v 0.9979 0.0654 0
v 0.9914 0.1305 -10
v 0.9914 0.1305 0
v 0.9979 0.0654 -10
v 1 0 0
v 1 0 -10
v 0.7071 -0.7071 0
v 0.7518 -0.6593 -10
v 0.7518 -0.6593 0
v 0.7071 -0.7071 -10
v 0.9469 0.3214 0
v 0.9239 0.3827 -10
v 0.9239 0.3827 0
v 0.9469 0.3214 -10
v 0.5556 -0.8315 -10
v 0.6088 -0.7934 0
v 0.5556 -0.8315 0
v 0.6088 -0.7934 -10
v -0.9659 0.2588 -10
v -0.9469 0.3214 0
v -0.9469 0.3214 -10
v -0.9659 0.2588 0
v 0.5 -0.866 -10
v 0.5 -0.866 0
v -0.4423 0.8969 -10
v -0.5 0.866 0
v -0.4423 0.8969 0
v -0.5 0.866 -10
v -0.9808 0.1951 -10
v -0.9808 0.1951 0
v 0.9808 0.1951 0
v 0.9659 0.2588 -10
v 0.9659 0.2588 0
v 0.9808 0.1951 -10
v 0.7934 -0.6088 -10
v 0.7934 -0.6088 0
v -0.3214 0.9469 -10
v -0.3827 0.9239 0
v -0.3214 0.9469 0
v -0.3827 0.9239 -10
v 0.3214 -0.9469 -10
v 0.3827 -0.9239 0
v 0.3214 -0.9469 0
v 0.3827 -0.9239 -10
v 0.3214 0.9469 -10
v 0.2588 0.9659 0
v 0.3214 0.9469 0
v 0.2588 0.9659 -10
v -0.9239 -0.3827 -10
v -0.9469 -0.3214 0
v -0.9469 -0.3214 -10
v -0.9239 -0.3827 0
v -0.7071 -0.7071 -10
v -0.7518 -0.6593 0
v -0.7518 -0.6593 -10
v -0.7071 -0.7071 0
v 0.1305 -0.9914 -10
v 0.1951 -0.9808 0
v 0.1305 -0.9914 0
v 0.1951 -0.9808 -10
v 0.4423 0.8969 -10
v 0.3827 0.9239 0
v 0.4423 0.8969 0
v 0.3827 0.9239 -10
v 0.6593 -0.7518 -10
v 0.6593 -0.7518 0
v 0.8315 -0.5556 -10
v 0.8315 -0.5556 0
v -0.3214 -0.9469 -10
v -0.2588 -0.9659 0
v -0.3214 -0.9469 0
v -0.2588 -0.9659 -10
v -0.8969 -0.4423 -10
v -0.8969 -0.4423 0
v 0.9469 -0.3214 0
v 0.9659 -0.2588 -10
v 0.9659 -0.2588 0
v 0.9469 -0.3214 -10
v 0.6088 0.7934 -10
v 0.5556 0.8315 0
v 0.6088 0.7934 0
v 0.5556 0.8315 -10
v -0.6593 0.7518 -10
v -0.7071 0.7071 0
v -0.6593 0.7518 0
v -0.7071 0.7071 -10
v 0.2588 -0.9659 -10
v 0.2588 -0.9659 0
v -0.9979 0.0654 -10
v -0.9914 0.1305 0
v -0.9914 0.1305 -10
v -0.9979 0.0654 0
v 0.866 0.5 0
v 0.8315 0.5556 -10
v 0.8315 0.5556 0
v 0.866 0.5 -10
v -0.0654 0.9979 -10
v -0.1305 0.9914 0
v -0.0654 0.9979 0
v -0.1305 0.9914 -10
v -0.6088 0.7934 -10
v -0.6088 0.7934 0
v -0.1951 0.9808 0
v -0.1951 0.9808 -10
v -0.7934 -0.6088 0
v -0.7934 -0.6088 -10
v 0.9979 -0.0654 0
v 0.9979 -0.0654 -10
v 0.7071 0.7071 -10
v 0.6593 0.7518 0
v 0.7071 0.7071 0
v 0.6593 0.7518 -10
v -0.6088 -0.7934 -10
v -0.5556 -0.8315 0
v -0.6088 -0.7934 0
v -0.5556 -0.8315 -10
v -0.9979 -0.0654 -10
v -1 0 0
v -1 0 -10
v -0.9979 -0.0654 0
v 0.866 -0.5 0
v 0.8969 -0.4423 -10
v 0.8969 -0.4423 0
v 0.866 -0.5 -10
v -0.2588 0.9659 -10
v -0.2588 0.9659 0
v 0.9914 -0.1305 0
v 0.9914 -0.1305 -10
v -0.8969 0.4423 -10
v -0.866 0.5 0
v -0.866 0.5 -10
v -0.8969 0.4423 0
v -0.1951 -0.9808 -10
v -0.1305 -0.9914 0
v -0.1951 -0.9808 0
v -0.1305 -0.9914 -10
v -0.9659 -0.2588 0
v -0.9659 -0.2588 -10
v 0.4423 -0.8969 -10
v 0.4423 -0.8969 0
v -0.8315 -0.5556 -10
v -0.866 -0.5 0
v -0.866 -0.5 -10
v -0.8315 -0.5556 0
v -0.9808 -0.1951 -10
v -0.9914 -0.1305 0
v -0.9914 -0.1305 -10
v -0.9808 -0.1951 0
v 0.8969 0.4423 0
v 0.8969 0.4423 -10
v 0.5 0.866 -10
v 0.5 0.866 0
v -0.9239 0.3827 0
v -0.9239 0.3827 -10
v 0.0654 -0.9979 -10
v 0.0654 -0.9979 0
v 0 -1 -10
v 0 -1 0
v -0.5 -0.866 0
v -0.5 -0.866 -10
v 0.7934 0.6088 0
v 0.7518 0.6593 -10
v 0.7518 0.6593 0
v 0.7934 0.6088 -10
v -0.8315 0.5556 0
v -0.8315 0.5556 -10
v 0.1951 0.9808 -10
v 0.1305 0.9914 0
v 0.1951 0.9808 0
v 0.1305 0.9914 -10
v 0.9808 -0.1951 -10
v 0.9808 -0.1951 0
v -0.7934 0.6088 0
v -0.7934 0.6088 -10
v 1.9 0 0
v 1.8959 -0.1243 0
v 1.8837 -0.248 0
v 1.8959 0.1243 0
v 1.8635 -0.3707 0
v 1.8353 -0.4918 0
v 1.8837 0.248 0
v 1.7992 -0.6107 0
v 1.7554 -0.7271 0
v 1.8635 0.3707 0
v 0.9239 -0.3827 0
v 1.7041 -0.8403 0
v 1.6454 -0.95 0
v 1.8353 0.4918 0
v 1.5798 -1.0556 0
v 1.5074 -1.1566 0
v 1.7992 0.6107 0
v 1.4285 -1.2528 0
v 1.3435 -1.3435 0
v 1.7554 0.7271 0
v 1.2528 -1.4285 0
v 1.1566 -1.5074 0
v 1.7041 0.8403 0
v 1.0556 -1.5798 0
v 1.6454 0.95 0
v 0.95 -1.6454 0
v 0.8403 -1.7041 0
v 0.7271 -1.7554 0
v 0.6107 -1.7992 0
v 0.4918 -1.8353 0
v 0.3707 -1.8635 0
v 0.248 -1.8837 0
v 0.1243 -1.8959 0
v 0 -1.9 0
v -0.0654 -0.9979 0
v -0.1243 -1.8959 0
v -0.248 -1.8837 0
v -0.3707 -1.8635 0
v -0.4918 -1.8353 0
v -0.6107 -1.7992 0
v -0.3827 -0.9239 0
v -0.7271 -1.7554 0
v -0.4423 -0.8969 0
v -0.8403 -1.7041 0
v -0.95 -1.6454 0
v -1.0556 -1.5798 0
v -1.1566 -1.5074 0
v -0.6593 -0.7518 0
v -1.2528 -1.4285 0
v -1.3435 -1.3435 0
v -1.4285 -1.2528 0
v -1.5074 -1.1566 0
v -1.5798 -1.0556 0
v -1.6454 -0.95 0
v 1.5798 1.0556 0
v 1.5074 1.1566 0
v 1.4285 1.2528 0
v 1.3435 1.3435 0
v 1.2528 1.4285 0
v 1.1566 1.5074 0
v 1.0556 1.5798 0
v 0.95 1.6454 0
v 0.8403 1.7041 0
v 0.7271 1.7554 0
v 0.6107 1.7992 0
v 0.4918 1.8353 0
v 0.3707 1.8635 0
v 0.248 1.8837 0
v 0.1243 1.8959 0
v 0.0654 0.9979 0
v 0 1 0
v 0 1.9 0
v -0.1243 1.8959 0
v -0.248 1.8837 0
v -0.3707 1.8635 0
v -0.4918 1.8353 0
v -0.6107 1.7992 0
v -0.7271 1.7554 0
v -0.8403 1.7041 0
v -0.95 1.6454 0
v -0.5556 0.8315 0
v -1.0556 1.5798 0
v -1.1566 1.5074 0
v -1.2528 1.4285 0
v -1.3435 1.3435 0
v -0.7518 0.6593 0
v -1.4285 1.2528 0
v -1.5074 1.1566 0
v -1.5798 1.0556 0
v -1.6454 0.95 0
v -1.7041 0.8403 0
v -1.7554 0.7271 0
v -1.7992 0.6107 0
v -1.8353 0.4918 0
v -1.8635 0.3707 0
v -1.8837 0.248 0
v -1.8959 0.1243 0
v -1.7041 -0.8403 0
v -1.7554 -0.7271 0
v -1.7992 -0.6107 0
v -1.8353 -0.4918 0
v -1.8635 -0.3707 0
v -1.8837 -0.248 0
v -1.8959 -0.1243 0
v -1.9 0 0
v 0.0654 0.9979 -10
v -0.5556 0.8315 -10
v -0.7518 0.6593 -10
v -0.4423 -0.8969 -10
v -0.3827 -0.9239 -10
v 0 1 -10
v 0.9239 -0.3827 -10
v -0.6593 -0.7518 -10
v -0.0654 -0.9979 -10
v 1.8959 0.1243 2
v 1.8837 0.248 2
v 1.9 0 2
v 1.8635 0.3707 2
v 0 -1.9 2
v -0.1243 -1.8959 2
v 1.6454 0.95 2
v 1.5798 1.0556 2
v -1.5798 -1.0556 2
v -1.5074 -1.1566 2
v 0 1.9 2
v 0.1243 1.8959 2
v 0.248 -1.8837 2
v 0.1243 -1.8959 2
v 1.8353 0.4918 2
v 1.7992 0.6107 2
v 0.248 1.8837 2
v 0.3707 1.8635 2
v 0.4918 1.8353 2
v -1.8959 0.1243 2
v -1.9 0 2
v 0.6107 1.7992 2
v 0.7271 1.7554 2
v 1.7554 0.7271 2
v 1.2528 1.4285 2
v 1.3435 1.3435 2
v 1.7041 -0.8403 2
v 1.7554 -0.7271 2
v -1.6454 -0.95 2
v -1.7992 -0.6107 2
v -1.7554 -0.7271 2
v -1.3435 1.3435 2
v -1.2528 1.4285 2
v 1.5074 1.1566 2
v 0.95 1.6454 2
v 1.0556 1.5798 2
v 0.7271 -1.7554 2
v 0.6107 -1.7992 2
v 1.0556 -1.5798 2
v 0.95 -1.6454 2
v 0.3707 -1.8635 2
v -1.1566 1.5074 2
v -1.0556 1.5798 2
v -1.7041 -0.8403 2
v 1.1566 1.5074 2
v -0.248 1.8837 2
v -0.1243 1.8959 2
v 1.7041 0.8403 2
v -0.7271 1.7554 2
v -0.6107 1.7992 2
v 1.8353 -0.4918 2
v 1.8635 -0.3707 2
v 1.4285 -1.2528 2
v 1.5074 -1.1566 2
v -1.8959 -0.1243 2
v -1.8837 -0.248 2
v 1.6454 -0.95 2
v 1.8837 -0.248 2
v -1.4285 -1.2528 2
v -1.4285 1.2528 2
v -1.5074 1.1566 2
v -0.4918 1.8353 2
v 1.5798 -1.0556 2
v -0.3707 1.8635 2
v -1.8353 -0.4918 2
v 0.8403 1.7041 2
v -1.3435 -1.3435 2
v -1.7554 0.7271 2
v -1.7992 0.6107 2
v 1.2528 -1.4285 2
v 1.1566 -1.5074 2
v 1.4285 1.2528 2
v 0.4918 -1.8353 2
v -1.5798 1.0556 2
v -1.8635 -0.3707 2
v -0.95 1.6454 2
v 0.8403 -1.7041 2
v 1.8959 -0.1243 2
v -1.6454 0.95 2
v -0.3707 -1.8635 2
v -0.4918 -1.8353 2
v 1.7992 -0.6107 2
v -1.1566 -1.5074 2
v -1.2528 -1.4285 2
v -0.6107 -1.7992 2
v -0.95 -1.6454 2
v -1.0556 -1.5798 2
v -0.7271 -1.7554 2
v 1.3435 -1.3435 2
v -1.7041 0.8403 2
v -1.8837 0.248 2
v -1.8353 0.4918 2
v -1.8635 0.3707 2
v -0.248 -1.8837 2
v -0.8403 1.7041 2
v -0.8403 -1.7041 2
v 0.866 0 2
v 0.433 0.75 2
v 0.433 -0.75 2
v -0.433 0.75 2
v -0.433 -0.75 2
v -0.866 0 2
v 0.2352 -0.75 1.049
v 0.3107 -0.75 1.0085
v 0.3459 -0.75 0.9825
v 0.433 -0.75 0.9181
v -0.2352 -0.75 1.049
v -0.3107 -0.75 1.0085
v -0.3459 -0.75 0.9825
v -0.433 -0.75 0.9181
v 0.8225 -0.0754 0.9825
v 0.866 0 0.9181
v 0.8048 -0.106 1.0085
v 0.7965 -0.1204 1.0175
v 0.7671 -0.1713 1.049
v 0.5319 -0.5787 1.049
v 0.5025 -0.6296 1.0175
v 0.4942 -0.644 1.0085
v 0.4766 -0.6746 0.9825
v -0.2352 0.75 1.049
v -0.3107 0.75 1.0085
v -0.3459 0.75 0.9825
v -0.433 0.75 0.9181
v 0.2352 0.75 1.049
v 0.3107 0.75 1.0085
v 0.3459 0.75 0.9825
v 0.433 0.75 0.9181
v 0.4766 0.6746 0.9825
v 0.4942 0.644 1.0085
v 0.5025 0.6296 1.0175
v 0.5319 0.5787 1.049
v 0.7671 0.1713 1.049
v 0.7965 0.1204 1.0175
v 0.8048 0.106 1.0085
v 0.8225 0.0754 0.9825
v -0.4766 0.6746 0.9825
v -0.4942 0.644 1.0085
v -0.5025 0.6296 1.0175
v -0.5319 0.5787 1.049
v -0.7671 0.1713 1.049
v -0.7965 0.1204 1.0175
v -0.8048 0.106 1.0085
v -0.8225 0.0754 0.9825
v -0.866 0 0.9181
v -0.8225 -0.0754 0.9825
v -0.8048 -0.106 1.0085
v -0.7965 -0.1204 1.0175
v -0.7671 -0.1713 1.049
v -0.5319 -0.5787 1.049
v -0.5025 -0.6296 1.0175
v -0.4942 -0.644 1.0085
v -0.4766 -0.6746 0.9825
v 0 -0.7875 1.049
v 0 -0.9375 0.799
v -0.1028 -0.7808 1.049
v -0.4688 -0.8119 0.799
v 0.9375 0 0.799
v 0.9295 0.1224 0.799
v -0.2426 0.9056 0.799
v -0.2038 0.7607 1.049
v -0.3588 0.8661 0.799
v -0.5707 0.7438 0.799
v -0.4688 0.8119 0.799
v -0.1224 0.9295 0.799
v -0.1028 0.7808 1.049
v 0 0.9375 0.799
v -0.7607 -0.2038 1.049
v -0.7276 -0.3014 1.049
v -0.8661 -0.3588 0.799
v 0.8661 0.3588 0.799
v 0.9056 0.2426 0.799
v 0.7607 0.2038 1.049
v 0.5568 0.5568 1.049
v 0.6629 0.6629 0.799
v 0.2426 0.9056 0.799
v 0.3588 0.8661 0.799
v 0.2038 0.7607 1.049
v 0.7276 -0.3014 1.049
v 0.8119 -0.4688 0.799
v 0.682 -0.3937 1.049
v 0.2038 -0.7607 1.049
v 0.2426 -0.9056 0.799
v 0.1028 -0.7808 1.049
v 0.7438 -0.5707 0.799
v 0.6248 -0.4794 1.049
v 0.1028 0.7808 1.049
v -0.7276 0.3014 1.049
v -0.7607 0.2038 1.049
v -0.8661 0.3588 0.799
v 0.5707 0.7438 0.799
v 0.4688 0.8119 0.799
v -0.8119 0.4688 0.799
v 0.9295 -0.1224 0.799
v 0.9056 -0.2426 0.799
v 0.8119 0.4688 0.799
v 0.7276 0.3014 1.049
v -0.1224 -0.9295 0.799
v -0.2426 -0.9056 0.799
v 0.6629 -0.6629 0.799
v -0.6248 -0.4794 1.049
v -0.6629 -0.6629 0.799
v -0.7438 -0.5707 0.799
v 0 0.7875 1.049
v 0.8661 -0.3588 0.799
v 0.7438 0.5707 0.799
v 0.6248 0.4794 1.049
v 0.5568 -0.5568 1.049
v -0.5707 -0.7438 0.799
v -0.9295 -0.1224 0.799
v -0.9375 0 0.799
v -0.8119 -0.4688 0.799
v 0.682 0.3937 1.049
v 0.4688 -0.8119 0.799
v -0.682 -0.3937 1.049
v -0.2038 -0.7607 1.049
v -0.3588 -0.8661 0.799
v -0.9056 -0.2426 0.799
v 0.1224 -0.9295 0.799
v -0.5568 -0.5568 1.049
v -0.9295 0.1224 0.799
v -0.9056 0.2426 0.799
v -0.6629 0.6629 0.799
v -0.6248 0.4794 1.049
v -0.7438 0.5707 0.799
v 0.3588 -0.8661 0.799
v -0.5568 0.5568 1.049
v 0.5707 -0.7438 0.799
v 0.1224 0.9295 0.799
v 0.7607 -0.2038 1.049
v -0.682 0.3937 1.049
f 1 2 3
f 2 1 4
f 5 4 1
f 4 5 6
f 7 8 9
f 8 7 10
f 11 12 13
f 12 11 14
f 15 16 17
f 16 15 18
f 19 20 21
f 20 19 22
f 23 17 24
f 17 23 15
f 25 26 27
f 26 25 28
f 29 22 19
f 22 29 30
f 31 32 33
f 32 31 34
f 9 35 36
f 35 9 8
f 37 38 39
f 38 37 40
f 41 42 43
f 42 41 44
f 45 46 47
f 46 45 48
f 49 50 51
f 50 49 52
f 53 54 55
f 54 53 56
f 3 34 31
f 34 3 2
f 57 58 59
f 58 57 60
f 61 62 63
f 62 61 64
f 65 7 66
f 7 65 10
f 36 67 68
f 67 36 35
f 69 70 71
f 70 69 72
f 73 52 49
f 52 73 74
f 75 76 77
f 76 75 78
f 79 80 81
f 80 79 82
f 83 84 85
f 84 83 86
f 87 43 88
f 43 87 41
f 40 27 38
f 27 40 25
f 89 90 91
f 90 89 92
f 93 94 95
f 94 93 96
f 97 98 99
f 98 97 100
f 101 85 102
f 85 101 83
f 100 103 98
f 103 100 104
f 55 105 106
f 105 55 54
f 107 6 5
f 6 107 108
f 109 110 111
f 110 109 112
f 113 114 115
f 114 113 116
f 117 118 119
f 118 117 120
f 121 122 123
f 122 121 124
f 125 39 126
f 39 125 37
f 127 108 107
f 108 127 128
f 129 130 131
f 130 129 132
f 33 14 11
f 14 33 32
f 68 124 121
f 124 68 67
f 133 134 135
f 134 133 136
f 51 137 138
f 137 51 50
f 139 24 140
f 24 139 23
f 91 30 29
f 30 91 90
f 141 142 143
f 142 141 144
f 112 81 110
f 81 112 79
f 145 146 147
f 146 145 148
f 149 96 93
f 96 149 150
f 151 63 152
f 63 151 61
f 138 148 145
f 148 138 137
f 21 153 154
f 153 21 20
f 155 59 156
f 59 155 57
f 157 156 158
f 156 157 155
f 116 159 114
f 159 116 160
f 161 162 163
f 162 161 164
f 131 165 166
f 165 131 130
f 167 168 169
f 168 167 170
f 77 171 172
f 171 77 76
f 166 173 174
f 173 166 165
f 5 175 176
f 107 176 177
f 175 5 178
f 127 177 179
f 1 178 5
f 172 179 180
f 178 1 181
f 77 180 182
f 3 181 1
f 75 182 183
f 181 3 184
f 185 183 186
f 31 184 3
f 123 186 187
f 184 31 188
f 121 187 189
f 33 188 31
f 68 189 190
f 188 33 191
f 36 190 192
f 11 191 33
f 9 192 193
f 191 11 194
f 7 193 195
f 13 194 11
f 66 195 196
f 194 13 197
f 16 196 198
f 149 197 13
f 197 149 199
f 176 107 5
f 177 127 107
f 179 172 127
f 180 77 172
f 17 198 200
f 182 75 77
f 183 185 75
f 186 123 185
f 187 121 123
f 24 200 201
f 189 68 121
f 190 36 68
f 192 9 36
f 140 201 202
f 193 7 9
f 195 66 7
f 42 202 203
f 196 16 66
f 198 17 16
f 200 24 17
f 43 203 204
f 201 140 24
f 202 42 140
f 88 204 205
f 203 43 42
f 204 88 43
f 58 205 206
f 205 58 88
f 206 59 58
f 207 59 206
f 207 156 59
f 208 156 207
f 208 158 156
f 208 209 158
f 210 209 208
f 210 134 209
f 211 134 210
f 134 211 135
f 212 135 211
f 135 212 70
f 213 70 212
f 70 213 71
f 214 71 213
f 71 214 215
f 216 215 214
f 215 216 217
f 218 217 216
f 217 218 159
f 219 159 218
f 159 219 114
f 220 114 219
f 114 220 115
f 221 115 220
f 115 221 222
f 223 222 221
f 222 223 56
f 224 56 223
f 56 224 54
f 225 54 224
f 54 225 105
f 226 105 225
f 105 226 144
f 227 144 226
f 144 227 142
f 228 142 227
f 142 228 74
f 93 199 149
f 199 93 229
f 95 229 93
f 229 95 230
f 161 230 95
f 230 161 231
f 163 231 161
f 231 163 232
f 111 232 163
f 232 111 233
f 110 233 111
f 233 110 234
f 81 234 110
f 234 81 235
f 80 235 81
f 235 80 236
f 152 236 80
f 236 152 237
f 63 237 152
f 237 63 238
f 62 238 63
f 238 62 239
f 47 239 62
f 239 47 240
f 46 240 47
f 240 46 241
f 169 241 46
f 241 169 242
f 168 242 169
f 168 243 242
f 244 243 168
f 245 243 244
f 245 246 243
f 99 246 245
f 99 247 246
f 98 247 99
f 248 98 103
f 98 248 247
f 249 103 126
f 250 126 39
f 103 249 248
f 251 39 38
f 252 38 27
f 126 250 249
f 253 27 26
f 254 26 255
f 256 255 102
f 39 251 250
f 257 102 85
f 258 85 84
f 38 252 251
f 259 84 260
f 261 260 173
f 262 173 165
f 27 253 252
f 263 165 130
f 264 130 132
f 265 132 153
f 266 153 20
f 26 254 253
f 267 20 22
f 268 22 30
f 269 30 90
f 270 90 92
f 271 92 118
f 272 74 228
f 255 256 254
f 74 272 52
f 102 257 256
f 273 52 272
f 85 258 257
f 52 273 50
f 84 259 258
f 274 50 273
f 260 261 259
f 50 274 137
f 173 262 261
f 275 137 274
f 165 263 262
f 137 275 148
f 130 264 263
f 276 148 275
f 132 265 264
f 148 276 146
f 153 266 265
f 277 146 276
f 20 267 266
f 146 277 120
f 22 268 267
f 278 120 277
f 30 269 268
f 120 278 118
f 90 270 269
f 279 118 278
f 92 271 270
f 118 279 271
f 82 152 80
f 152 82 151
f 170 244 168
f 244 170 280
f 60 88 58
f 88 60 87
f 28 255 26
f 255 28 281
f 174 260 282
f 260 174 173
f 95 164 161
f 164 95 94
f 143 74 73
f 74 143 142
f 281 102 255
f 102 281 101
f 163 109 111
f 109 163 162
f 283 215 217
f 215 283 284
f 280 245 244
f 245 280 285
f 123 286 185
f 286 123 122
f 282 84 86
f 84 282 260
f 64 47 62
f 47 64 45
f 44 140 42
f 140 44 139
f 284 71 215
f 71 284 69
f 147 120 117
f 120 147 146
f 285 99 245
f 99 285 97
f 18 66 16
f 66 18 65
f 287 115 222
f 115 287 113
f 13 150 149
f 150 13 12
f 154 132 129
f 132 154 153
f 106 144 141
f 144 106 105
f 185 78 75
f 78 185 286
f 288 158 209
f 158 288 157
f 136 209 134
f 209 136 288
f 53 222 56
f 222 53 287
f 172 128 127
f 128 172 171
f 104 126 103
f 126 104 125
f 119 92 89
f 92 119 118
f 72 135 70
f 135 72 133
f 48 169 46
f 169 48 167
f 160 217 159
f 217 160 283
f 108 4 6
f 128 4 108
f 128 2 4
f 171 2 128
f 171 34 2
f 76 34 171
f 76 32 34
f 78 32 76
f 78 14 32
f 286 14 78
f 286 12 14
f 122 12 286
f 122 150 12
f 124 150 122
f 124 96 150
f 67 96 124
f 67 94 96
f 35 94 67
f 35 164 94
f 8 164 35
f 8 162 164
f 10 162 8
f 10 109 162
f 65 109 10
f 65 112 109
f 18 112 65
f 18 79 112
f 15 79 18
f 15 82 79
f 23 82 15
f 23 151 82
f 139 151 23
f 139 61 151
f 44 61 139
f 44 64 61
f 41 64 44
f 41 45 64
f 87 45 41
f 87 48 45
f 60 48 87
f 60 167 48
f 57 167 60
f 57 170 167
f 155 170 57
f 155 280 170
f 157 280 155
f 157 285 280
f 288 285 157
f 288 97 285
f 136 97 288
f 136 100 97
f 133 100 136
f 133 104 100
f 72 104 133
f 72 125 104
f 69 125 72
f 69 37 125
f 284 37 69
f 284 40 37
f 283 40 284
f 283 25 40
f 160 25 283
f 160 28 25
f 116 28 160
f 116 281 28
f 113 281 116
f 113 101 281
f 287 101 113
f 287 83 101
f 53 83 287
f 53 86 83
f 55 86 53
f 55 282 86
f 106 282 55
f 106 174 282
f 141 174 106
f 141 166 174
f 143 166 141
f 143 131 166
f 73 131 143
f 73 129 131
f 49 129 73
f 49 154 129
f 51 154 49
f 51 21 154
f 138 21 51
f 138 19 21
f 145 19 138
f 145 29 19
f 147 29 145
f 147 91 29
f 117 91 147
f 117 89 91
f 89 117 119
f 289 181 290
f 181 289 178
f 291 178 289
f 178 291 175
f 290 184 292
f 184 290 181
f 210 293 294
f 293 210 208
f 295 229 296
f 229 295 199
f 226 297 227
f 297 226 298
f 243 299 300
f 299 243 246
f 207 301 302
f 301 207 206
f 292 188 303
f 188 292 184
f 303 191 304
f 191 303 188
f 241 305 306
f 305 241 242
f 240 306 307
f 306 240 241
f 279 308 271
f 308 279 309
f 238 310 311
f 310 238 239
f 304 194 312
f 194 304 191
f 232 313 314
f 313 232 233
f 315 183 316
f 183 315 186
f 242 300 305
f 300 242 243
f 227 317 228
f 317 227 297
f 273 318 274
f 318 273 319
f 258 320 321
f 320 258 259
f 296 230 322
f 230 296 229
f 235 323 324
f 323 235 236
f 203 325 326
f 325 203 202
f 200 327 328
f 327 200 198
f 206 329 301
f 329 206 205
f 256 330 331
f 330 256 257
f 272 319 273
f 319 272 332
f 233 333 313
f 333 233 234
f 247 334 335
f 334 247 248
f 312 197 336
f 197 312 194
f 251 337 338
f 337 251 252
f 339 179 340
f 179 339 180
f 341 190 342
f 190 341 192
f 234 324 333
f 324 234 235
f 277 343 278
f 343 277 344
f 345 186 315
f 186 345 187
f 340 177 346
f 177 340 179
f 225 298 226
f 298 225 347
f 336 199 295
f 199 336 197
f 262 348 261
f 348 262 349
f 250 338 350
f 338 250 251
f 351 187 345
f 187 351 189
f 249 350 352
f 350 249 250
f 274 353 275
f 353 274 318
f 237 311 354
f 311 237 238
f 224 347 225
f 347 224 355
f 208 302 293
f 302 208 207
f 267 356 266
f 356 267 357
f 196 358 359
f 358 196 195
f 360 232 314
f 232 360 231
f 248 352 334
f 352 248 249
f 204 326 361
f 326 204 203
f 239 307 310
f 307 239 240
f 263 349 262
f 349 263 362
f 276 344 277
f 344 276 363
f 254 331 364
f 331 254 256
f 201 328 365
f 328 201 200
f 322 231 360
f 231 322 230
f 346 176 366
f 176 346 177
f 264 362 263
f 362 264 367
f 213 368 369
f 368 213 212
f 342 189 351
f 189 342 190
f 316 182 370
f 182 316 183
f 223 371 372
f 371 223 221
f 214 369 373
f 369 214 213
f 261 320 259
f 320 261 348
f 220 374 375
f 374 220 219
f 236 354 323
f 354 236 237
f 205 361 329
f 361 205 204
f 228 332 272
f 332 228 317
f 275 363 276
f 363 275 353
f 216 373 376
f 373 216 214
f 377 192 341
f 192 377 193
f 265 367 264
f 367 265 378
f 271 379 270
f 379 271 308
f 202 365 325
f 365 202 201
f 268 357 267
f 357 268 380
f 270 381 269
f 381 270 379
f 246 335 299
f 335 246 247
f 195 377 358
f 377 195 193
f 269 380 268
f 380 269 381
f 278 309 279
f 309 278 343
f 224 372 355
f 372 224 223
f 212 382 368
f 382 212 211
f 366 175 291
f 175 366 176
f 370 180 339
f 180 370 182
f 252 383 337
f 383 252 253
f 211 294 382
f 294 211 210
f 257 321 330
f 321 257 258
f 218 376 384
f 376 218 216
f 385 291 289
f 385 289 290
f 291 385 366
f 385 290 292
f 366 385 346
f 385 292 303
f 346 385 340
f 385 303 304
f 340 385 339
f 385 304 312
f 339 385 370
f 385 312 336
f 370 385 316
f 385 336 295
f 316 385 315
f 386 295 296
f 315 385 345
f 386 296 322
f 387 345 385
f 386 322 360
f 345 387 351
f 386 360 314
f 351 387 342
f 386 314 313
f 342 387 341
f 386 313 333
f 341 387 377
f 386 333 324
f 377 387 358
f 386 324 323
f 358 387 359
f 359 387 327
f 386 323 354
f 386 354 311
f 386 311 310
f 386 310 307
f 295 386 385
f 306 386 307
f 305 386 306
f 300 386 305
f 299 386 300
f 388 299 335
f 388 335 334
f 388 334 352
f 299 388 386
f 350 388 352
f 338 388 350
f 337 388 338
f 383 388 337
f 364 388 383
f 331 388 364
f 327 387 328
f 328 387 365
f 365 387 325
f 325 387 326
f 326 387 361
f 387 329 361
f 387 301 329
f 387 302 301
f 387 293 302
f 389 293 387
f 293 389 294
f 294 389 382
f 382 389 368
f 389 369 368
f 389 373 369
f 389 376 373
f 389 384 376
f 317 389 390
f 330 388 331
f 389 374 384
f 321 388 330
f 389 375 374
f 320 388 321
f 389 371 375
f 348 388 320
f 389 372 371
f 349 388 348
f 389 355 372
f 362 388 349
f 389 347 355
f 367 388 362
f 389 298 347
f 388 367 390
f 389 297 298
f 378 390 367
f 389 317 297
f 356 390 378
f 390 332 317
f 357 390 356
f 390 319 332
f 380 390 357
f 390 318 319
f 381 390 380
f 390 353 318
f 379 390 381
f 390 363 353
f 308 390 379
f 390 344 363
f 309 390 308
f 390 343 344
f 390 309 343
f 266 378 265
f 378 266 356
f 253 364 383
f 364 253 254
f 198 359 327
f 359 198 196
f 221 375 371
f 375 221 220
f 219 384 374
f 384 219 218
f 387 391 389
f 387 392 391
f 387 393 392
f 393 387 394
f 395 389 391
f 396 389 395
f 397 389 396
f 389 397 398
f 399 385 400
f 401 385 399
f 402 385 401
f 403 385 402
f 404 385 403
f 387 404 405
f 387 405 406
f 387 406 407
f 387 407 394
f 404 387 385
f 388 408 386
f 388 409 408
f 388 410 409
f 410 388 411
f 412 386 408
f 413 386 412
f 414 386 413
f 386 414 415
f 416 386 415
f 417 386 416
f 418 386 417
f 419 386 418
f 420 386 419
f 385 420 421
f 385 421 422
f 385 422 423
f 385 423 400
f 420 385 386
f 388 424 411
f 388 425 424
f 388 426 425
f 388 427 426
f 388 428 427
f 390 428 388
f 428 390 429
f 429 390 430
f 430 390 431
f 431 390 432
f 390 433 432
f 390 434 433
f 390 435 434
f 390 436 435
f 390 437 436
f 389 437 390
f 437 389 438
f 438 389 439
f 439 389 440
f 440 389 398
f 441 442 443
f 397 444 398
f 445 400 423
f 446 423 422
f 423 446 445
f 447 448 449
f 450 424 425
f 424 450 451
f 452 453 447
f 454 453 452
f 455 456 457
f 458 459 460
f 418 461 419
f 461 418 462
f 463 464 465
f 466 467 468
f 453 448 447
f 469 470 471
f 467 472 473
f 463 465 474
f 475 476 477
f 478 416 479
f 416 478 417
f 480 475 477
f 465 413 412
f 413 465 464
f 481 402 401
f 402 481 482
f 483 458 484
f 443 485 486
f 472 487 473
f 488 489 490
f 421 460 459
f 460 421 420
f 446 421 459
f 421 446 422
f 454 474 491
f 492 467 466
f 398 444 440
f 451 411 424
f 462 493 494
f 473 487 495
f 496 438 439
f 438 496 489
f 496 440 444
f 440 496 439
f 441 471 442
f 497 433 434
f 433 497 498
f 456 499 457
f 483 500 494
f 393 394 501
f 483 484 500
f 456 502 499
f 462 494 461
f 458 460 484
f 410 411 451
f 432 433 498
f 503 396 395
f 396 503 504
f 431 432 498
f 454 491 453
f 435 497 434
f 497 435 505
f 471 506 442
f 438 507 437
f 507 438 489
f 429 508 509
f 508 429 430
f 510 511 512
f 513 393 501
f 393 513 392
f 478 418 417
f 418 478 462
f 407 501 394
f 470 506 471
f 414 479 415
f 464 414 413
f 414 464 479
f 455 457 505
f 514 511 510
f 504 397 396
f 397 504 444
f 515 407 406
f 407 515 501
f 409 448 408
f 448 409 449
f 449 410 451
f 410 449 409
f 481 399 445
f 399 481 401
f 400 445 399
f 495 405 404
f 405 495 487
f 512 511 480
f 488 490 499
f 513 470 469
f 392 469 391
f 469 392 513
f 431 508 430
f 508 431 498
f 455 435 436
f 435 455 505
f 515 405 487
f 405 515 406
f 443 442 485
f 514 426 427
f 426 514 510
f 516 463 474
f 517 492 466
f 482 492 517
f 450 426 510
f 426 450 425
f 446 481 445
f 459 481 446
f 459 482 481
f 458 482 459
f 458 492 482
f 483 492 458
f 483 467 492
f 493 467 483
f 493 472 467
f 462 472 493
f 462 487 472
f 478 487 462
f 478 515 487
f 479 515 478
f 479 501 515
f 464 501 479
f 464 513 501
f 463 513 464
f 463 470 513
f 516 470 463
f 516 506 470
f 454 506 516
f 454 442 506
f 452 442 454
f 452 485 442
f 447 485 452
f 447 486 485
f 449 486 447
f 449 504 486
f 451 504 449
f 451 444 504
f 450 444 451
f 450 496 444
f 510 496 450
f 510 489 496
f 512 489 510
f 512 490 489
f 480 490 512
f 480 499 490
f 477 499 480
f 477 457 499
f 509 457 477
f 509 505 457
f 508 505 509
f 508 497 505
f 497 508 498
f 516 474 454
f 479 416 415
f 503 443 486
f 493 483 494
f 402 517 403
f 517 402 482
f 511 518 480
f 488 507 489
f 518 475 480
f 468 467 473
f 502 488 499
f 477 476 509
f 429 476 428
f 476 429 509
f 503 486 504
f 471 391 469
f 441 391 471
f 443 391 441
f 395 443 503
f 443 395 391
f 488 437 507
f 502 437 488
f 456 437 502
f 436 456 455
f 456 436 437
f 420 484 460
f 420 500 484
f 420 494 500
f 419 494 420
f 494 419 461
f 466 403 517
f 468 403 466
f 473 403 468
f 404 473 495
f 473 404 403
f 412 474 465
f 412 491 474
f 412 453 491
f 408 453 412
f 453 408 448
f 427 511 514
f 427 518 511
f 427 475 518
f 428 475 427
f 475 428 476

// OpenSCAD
$fn = 96;

d_shaft = 2.0;
L = 10.0;

d_head = 3.8;
h_head = 2.0;

socket_af = 1.5;      // hex across flats (approx for M2)
socket_depth = 1.2;   // socket depth
socket_chamfer = 0.25;

module hex_prism(af, h) {
    // Regular hex with across-flats = af
    r = af / sqrt(3);
    cylinder(h = h, r = r, $fn = 6);
}

module socket_head_cap_screw() {
    difference() {
        union() {
            // Shaft
            translate([0,0,-L])
                cylinder(h = L, d = d_shaft);

            // Head (slight top edge chamfer)
            cylinder(h = h_head, d = d_head);
            translate([0,0,h_head-0.25])
                cylinder(h = 0.25, d1 = d_head, d2 = d_head - 0.4);
        }

        // Hex socket
        translate([0,0,h_head - socket_depth])
            hex_prism(socket_af, socket_depth + 0.02);

        // Small lead-in chamfer for socket
        translate([0,0,h_head - socket_depth - 0.001])
            cylinder(h = socket_chamfer, d1 = socket_af*1.25, d2 = socket_af*1.05, $fn = 48);
    }
}

socket_head_cap_screw();
